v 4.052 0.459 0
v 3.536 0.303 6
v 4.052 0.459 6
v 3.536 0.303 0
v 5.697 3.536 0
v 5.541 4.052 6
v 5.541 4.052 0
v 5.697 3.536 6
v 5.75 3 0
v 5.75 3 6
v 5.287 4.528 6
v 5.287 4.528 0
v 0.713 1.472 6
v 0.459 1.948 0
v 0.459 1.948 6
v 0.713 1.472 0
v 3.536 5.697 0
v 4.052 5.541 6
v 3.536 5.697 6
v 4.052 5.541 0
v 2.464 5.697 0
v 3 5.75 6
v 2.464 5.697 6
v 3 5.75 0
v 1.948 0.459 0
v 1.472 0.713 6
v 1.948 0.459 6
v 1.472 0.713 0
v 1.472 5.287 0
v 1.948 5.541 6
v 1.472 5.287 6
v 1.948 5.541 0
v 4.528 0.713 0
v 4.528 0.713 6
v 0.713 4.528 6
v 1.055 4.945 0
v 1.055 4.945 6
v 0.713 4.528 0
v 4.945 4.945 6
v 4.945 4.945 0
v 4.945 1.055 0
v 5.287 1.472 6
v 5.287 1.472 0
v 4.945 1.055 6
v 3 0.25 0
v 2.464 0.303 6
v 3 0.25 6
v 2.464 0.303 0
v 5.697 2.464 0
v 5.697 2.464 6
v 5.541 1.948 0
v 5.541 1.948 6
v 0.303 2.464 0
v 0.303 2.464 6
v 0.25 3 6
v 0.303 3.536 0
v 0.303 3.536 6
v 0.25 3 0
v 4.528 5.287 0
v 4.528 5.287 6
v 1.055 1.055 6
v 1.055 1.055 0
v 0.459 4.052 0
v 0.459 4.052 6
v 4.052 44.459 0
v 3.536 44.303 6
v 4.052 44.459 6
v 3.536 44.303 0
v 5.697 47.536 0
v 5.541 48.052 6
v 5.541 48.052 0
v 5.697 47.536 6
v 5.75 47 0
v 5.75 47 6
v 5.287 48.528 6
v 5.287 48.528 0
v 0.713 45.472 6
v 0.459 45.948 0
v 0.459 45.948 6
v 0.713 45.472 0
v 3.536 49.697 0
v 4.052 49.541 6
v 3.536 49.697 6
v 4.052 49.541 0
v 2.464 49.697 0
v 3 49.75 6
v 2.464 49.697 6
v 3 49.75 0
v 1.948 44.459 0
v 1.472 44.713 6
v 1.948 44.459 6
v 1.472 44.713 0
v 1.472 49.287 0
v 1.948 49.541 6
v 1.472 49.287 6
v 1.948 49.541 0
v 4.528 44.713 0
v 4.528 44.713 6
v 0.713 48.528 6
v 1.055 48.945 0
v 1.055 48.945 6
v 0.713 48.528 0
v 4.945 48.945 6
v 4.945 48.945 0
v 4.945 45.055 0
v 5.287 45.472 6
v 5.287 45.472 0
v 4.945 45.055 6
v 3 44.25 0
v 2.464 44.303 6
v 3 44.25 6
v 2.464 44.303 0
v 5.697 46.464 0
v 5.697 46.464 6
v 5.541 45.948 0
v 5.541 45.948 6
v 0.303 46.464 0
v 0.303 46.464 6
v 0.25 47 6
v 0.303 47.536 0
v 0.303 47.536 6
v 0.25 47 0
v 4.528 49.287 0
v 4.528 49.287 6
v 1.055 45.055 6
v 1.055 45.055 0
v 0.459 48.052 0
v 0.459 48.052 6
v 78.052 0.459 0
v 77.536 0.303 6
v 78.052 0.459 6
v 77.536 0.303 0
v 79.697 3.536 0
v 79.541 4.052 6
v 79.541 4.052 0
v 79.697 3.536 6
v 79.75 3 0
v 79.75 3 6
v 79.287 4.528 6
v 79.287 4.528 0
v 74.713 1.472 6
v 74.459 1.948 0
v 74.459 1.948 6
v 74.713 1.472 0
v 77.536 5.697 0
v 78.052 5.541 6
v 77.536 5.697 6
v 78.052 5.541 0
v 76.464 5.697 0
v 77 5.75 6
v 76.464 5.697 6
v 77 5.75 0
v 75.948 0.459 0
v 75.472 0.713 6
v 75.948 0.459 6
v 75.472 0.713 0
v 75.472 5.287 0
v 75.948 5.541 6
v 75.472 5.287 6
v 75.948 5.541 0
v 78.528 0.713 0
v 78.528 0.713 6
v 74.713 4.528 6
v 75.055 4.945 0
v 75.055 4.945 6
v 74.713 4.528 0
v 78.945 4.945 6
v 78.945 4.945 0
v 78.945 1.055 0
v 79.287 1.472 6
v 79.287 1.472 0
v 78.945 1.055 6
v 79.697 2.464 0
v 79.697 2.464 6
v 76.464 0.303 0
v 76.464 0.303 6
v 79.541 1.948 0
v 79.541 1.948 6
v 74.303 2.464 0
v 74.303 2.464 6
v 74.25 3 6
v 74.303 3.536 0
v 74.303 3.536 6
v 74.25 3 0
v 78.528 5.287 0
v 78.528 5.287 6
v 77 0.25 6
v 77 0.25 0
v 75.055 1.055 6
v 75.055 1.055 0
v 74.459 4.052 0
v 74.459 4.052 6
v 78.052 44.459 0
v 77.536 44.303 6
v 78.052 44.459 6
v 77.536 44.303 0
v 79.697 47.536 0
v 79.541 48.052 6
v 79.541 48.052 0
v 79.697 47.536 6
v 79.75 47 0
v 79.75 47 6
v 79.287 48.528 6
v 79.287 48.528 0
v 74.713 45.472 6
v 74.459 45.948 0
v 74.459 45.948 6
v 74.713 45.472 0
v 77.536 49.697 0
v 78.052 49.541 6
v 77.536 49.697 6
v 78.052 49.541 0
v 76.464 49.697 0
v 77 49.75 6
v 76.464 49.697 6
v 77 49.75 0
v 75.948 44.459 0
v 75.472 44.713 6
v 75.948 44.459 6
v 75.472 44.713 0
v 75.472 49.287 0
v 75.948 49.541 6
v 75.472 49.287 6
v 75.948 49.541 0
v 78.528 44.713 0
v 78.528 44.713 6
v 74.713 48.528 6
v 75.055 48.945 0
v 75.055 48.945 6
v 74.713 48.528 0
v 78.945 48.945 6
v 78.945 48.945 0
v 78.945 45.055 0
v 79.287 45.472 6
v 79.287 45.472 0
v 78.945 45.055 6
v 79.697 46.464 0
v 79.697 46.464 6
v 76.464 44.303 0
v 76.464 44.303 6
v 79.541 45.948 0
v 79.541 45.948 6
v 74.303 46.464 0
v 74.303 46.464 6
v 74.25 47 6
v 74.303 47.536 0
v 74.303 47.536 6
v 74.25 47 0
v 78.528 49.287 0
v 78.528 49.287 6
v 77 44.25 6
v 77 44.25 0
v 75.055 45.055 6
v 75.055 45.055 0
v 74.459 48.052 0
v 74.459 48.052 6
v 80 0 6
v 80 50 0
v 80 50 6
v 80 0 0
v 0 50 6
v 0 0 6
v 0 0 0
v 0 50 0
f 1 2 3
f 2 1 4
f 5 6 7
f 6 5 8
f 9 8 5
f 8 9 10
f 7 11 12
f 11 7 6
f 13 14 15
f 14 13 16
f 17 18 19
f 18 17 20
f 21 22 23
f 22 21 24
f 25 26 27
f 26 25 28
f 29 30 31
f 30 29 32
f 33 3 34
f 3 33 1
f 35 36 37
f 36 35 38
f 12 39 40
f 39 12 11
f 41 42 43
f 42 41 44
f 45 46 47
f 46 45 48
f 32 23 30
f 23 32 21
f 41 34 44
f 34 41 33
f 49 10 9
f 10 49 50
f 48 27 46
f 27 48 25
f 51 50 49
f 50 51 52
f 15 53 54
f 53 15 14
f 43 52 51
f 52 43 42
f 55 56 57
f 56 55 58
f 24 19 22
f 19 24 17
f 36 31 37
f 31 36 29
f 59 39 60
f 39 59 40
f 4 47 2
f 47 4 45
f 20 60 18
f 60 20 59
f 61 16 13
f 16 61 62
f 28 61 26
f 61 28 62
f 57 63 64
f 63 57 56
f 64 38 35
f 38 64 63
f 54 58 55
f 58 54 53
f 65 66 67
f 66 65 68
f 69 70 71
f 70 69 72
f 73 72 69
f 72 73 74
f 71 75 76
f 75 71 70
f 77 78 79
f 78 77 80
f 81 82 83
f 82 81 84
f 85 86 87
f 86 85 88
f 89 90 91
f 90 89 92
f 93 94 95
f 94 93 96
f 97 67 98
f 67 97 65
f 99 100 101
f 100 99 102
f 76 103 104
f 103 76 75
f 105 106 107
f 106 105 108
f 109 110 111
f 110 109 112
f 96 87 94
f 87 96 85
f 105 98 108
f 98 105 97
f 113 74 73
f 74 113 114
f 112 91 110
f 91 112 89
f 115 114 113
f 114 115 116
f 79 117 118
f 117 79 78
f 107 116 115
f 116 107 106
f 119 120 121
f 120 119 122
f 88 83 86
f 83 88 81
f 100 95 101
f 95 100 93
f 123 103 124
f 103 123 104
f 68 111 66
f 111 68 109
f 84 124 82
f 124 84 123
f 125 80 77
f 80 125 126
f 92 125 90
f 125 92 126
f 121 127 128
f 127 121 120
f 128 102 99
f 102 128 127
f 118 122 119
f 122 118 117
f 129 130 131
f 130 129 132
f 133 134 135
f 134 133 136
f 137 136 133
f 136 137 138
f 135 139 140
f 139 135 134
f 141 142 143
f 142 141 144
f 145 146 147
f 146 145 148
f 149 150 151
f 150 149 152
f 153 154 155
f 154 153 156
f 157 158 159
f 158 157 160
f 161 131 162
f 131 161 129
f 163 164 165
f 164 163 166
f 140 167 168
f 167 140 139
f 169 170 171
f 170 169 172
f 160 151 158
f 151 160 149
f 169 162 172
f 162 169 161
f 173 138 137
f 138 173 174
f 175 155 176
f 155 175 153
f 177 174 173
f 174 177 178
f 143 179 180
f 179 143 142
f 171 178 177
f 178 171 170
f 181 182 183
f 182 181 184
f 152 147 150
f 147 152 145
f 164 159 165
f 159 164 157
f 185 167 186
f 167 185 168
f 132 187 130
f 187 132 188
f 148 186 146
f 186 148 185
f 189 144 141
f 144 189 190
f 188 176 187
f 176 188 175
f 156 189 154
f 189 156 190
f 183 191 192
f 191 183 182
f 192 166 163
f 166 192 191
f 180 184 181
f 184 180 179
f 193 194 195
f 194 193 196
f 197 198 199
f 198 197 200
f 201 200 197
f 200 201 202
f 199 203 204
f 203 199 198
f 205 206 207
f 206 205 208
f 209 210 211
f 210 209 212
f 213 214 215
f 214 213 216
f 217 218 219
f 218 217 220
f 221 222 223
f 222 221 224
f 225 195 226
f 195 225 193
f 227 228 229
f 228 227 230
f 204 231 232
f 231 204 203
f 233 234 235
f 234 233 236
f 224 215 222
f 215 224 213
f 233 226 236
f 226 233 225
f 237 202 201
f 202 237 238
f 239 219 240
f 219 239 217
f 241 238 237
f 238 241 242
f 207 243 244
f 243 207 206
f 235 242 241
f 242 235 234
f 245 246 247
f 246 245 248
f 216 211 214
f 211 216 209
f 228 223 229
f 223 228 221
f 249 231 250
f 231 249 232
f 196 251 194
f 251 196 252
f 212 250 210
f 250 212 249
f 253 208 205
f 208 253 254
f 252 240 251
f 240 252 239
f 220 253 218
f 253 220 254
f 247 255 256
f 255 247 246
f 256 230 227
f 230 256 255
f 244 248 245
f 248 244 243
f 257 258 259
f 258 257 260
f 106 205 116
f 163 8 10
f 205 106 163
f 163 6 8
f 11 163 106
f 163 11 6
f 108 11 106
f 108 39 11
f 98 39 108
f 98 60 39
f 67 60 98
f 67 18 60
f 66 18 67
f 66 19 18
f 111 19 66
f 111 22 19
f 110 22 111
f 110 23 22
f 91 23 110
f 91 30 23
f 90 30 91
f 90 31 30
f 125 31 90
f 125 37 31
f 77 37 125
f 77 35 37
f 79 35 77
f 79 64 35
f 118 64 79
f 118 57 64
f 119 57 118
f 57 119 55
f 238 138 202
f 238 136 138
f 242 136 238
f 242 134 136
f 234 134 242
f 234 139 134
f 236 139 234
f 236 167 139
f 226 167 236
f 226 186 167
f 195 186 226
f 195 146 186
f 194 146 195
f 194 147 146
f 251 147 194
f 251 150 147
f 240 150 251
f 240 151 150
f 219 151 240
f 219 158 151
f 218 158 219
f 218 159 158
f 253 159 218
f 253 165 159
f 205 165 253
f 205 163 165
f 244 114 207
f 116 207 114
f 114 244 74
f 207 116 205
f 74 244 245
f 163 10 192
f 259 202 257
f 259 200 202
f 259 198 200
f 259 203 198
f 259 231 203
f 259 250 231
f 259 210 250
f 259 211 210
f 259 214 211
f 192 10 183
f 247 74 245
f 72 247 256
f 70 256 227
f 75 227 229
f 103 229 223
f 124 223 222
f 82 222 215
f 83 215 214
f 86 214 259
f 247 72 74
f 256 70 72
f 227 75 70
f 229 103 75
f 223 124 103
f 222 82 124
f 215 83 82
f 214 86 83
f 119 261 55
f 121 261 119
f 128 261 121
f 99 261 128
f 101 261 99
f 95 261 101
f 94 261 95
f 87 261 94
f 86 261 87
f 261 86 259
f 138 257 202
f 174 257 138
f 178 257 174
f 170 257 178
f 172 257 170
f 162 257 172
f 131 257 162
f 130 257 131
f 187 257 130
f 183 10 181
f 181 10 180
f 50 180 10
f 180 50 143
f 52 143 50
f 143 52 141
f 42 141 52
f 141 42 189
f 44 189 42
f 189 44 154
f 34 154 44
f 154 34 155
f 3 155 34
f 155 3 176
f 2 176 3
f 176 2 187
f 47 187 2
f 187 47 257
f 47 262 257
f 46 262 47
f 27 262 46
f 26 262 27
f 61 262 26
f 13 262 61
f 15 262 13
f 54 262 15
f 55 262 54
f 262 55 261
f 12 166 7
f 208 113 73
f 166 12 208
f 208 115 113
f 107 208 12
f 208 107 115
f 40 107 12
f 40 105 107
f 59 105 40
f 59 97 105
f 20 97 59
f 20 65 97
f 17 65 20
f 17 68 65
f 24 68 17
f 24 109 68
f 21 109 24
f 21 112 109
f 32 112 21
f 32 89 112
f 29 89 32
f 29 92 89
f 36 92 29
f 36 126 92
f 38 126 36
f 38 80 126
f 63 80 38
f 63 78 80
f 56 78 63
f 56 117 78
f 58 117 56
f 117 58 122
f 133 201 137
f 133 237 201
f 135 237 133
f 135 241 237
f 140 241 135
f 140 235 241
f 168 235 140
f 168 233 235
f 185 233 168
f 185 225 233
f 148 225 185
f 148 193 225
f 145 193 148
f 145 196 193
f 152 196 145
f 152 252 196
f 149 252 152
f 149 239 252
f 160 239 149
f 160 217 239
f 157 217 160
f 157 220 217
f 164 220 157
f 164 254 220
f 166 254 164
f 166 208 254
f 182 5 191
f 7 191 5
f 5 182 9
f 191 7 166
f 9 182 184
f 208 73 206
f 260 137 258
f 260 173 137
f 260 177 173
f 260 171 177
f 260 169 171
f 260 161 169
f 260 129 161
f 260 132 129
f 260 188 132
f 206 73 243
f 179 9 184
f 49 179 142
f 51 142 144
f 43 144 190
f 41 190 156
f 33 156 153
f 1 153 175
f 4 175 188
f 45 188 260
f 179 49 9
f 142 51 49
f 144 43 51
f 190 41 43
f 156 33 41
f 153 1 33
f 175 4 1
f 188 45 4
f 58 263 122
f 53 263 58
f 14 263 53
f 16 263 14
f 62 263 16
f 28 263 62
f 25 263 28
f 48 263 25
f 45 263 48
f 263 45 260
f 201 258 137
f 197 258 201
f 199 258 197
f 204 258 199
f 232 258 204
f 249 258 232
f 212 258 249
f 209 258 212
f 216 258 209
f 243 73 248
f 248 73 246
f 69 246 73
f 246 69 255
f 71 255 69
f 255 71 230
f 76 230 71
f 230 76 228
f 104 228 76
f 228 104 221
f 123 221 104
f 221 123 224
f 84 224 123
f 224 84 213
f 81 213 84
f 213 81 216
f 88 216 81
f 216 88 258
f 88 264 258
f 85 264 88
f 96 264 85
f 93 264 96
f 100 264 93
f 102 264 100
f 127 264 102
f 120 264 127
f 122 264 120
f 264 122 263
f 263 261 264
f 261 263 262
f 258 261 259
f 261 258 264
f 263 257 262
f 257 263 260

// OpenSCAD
$fn = 32;

// ----------------------------------------------------------------------
// Enclosure lid: 80 x 50 x 6 mm, 4 bolt holes
// ----------------------------------------------------------------------

// --- parameters (mm) ---
length = 80;              // lid length, X
width = 50;               // lid width, Y
plate_t = 6;              // lid plate thickness
bolt_d = 5.5;             // bolt clearance
boss_lip = 3;             // bolt hole inset from the corner
sink = 1;                 // overlap of the lip and ribs into the plate

module plate() {
  cube([length, width, plate_t]);
}

difference() {
  plate();
  /* bolt pattern matching the corner bosses */
  for (sx = [0, 1]) for (sy = [0, 1])
    translate([sx * (length - 2 * boss_lip) + boss_lip, sy * (width - 2 * boss_lip) + boss_lip, -0 - 1])
      cylinder(h = plate_t + 0 + 2, d = bolt_d);
}
